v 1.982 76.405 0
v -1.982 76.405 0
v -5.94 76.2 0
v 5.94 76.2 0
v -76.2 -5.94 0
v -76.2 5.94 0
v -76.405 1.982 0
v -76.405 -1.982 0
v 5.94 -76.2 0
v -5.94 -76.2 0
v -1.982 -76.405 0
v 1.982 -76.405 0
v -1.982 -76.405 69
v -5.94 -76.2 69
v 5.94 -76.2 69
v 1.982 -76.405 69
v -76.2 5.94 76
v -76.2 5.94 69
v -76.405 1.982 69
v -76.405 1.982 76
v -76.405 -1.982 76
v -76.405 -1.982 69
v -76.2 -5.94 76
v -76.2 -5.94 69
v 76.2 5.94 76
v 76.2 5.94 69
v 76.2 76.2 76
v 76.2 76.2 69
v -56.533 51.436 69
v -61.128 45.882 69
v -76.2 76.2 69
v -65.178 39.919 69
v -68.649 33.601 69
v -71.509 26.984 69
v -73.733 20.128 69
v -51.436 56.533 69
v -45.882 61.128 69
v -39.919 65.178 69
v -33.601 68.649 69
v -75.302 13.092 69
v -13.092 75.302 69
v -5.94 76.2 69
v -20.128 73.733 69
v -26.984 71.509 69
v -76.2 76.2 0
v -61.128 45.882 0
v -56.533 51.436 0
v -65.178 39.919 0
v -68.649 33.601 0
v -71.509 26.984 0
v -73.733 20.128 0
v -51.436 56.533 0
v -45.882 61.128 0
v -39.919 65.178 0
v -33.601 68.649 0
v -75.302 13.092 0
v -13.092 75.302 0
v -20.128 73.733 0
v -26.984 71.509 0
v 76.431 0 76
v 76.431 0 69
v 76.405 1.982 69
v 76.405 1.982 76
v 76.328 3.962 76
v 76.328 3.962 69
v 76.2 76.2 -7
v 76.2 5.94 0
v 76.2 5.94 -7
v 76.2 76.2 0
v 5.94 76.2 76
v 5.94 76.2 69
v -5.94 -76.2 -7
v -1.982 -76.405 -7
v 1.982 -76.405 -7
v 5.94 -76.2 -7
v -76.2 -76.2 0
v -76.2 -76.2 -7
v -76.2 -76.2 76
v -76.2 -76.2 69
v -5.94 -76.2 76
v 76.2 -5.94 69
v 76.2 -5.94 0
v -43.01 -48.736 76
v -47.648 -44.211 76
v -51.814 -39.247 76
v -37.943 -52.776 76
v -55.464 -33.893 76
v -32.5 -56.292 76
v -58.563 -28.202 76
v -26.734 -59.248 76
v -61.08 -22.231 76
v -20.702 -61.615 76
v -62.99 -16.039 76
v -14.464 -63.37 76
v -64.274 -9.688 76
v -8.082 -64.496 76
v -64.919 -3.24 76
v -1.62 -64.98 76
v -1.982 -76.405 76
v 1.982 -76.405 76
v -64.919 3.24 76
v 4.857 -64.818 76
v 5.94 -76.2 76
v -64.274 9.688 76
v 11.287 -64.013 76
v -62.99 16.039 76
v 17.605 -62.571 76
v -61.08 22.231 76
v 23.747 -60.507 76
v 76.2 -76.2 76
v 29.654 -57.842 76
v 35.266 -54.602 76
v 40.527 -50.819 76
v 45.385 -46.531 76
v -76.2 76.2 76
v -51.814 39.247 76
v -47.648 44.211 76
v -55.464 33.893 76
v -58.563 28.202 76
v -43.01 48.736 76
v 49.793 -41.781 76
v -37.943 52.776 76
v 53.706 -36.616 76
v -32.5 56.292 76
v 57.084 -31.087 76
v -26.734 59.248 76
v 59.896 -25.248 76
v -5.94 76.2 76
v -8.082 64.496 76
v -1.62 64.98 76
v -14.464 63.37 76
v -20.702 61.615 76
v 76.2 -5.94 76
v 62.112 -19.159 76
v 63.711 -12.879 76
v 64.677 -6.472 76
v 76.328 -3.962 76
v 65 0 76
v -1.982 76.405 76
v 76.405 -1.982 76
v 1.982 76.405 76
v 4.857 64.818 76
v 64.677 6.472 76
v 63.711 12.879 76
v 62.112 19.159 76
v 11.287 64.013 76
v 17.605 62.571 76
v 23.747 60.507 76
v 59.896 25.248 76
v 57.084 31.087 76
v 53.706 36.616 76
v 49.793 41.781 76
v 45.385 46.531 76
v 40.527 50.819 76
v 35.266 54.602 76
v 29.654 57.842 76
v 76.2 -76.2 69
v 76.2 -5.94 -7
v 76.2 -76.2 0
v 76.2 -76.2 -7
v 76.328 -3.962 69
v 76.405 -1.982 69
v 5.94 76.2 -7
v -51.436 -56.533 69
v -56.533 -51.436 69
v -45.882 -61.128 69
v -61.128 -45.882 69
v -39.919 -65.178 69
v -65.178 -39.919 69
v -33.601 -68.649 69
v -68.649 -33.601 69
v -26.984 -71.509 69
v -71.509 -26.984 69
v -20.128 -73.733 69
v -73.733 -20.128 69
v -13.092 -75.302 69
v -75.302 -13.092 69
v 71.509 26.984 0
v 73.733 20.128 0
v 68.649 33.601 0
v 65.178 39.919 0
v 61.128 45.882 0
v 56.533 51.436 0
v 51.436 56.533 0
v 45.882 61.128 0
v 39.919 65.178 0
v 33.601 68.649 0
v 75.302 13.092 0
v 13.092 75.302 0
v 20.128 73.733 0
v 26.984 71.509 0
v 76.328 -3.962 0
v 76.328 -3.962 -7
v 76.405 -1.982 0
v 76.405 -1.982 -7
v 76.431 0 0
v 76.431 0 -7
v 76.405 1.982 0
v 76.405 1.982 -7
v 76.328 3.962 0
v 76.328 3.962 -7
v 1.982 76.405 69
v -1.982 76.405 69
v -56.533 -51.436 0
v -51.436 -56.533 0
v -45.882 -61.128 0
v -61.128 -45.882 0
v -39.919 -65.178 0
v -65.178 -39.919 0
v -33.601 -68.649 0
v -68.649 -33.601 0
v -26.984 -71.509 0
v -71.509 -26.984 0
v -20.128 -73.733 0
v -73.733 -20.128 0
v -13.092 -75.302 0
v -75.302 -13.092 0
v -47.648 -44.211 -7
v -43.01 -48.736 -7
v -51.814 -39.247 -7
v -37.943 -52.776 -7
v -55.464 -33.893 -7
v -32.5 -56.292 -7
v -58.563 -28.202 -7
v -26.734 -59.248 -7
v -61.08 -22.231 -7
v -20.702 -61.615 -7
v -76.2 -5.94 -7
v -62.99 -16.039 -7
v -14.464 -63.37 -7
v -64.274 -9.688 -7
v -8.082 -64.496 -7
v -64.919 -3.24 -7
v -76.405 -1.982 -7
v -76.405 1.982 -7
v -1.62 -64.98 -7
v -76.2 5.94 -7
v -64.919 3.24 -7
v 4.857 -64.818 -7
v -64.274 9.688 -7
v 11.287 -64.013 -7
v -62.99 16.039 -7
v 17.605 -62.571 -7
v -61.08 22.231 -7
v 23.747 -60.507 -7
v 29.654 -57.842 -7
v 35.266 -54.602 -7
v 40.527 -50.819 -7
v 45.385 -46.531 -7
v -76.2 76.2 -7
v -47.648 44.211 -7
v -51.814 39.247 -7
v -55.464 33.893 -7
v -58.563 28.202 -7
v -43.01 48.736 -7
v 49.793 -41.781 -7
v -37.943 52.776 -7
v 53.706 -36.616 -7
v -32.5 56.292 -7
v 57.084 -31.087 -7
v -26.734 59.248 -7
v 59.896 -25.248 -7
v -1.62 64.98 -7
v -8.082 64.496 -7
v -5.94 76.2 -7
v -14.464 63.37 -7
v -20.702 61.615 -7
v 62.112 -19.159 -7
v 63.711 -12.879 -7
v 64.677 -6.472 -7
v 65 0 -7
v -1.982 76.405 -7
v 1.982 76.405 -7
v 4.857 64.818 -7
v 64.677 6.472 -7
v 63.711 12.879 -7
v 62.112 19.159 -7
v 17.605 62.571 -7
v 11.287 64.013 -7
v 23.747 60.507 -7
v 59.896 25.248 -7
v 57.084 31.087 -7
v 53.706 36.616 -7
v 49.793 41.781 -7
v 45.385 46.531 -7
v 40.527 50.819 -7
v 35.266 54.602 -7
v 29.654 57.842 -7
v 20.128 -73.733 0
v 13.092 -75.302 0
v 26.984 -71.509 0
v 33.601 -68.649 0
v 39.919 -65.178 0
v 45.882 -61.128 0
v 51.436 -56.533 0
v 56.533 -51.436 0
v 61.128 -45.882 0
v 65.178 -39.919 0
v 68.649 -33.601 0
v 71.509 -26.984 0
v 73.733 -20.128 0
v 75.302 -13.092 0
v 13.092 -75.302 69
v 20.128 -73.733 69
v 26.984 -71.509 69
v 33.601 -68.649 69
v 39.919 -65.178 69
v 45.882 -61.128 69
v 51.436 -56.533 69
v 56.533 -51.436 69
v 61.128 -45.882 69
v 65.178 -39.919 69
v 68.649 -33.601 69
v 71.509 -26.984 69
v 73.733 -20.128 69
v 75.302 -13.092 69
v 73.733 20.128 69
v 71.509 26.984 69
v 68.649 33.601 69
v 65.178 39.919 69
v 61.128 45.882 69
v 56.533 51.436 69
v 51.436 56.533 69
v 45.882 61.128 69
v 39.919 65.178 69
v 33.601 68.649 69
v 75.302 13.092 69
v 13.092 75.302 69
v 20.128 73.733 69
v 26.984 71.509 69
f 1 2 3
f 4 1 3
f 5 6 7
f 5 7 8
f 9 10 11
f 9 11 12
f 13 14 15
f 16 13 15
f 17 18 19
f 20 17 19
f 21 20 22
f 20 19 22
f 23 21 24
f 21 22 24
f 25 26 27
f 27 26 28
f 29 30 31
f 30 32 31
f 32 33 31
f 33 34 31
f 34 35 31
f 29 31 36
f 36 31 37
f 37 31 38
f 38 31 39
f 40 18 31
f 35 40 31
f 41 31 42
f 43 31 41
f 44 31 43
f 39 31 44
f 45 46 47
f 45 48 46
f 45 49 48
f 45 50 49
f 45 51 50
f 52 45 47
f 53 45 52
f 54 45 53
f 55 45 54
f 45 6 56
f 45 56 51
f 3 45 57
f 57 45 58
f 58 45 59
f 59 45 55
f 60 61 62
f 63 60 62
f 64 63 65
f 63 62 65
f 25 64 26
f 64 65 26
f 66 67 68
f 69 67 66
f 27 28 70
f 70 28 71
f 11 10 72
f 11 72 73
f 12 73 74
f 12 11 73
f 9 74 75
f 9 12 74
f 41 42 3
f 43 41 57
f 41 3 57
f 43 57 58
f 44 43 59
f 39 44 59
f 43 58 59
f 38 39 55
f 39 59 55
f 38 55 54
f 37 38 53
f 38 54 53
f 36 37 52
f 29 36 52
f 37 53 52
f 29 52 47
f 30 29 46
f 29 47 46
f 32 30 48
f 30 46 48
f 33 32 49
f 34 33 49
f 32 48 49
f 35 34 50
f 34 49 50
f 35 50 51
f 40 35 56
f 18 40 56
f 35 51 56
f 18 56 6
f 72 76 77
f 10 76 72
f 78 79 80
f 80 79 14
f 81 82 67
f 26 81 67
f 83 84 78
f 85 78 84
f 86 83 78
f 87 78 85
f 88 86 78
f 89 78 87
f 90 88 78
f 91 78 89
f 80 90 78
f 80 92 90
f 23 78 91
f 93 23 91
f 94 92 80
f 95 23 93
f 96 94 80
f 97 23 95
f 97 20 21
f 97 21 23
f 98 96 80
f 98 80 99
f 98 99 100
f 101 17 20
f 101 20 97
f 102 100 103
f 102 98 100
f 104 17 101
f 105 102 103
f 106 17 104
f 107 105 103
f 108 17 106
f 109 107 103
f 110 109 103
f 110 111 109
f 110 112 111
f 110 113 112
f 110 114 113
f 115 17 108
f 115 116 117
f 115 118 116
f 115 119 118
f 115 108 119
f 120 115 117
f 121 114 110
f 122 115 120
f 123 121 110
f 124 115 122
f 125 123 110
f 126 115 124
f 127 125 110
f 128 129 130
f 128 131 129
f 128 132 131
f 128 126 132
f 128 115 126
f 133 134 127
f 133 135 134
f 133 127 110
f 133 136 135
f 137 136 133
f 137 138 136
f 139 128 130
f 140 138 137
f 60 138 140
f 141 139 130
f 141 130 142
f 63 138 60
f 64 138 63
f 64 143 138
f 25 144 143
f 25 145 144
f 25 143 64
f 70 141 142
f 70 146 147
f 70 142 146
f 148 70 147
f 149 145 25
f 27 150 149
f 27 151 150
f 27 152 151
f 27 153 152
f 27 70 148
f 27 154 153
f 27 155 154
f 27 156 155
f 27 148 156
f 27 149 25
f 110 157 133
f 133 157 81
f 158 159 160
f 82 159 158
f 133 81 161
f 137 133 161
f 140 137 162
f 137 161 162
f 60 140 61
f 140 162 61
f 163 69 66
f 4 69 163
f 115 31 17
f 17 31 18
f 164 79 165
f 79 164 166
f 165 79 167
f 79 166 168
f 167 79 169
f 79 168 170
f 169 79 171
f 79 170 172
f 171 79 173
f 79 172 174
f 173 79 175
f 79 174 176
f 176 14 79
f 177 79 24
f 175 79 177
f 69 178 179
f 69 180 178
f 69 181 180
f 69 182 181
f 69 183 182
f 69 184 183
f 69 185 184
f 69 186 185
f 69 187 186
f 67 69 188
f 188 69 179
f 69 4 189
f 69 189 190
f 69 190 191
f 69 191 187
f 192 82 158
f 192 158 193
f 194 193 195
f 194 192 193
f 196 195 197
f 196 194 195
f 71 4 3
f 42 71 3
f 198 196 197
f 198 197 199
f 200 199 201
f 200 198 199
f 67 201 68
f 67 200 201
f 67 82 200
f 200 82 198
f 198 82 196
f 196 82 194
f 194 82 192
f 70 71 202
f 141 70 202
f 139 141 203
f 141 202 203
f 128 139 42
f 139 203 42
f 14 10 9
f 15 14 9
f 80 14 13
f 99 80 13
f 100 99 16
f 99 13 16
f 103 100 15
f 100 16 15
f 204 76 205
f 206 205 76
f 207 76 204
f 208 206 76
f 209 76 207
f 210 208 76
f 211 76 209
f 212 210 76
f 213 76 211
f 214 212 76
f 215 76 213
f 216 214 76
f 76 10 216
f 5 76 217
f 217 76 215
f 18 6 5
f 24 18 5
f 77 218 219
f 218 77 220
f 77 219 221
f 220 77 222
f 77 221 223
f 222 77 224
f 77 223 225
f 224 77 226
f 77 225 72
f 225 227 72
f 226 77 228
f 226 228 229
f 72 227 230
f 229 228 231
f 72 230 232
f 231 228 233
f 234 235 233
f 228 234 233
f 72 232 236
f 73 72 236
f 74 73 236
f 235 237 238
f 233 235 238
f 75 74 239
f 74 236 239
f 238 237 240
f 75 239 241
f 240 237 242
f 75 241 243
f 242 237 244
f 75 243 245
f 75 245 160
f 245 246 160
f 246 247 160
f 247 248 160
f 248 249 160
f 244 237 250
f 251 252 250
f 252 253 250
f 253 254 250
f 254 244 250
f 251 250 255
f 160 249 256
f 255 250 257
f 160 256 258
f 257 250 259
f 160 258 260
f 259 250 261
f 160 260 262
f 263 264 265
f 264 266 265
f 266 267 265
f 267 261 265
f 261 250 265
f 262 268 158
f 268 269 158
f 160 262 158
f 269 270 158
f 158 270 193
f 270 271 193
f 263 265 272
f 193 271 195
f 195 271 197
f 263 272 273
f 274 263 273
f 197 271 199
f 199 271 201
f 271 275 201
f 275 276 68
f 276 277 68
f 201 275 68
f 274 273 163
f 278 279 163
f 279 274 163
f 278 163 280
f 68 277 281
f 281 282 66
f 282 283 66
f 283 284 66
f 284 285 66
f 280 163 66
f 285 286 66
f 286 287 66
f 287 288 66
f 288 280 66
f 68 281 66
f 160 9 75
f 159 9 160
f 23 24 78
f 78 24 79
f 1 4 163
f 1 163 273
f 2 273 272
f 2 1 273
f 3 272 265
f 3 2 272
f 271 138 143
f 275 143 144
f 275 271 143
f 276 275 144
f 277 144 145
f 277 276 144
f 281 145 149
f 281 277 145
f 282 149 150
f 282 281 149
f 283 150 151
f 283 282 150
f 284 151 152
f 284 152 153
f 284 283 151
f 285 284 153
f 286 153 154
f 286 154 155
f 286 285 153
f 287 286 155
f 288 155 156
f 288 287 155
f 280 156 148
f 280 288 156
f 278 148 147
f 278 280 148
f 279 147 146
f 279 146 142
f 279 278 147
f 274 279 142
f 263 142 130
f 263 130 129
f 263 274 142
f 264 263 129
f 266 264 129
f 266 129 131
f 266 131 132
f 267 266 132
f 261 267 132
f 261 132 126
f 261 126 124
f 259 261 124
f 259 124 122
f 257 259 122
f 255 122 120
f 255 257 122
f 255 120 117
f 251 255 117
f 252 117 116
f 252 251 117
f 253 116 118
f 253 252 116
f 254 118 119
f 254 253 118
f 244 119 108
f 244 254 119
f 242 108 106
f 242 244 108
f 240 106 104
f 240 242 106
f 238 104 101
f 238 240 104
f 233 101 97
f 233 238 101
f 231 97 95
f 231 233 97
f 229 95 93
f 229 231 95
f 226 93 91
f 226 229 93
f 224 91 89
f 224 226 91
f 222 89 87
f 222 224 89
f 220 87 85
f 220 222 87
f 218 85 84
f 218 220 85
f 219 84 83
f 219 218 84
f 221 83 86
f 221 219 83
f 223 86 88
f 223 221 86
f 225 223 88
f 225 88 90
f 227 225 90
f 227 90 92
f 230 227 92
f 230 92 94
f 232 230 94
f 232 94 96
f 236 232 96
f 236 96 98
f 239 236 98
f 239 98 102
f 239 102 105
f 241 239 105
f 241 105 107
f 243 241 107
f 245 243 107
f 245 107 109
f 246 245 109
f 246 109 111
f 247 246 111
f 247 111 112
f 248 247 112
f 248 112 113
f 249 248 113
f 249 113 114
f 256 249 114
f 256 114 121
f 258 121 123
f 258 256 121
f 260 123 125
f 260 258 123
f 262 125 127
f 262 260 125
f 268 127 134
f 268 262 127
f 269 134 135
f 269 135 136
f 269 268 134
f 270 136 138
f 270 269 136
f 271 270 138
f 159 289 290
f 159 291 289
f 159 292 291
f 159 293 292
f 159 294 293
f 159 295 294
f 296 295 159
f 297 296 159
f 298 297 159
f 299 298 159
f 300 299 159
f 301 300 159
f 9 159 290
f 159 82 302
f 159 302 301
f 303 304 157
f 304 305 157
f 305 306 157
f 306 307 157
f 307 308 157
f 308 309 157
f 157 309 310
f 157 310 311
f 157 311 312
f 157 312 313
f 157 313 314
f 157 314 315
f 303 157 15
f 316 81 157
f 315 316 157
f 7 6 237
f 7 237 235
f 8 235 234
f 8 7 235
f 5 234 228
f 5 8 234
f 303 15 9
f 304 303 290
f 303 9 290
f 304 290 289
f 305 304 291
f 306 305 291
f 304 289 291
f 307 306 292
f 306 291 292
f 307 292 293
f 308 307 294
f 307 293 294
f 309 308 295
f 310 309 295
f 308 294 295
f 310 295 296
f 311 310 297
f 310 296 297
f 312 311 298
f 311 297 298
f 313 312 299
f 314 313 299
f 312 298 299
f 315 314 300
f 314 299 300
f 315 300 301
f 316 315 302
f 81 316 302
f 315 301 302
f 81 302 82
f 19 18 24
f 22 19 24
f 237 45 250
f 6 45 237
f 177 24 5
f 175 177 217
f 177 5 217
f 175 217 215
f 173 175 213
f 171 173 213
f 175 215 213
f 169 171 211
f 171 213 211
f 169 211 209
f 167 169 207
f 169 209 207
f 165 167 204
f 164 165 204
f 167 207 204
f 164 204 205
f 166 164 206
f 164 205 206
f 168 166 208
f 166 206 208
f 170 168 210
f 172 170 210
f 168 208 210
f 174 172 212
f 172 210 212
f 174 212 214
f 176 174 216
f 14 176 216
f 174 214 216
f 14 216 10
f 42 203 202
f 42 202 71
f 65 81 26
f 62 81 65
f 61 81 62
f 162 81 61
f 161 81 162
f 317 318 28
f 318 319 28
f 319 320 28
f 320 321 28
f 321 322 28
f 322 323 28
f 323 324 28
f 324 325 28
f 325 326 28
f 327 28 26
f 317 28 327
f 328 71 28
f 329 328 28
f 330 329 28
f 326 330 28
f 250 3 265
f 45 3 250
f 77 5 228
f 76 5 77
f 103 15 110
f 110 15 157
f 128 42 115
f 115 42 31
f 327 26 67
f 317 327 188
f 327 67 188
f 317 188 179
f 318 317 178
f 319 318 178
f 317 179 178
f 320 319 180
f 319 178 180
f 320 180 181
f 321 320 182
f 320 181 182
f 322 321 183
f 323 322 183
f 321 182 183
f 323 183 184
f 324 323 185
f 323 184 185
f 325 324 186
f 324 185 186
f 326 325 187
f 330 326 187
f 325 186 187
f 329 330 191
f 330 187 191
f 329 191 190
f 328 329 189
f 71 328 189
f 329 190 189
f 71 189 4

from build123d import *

# Parameters (mm, degrees)
F0_R     = 65
F1_DEPTH = 69
F2_DEPTH = 7
F3_R     = 65
F4_DEPTH = 7


with BuildPart() as f1:
    # F0 (on Top) → F1 (new body)
    with BuildSketch(Plane.XY):
        with BuildLine():
            Line((-5.939693756, -76.2), (5.939693756, -76.2))
            ThreePointArc((5.939693756, -76.2), (54.0449810894, -54.0449810894), (76.2, -5.939693756))
            Line((76.2, -5.939693756), (76.2, 5.939693756))
            ThreePointArc((76.2, 5.939693756), (54.0449810894, 54.0449810894), (5.939693756, 76.2))
            Line((5.939693756, 76.2), (-5.939693756, 76.2))
            ThreePointArc((-5.939693756, 76.2), (-54.0449810894, 54.0449810894), (-76.2, 5.939693756))
            Line((-76.2, 5.939693756), (-76.2, -5.939693756))
            ThreePointArc((-76.2, -5.939693756), (-54.0449810894, -54.0449810894), (-5.939693756, -76.2))
        make_face()
        Circle(F0_R, mode=Mode.SUBTRACT)
    extrude(amount=F1_DEPTH)

    # F0 (on Top) → F2 (join)
    with BuildSketch(Plane.XY):
        with BuildLine():
            Line((5.939693756, -76.2), (76.2, -76.2))
            Line((76.2, -76.2), (76.2, -5.939693756))
            ThreePointArc((76.2, -5.939693756), (54.0449810894, -54.0449810894), (5.939693756, -76.2))
        make_face()
        with BuildLine():
            ThreePointArc((-5.939693756, -76.2), (0, -76.4311452349), (5.939693756, -76.2))
            Line((5.939693756, -76.2), (-5.939693756, -76.2))
        make_face()
        with BuildLine():
            Line((-5.939693756, -76.2), (5.939693756, -76.2))
            ThreePointArc((5.939693756, -76.2), (54.0449810894, -54.0449810894), (76.2, -5.939693756))
            Line((76.2, -5.939693756), (76.2, 5.939693756))
            ThreePointArc((76.2, 5.939693756), (54.0449810894, 54.0449810894), (5.939693756, 76.2))
            Line((5.939693756, 76.2), (-5.939693756, 76.2))
            ThreePointArc((-5.939693756, 76.2), (-54.0449810894, 54.0449810894), (-76.2, 5.939693756))
            Line((-76.2, 5.939693756), (-76.2, -5.939693756))
            ThreePointArc((-76.2, -5.939693756), (-54.0449810894, -54.0449810894), (-5.939693756, -76.2))
        make_face()
        Circle(F0_R, mode=Mode.SUBTRACT)
        with BuildLine():
            Line((76.2, 5.939693756), (76.2, -5.939693756))
            ThreePointArc((76.2, -5.939693756), (76.3733370648, -2.9720948014), (76.4311452349, 0))
            ThreePointArc((76.4311452349, 0), (76.3733370648, 2.9720948014), (76.2, 5.939693756))
        make_face()
        with BuildLine():
            Line((-76.2, -76.2), (-5.939693756, -76.2))
            ThreePointArc((-5.939693756, -76.2), (-54.0449810894, -54.0449810894), (-76.2, -5.939693756))
            Line((-76.2, -5.939693756), (-76.2, -76.2))
        make_face()
        with BuildLine():
            ThreePointArc((5.939693756, 76.2), (54.0449810894, 54.0449810894), (76.2, 5.939693756))
            Line((76.2, 5.939693756), (76.2, 76.2))
            Line((76.2, 76.2), (5.939693756, 76.2))
        make_face()
        with BuildLine():
            ThreePointArc((-76.2, 5.939693756), (-76.4311452349, 0), (-76.2, -5.939693756))
            Line((-76.2, -5.939693756), (-76.2, 5.939693756))
        make_face()
        with BuildLine():
            Line((-5.939693756, 76.2), (5.939693756, 76.2))
            ThreePointArc((5.939693756, 76.2), (0, 76.4311452349), (-5.939693756, 76.2))
        make_face()
        with BuildLine():
            Line((-76.2, 76.2), (-76.2, 5.939693756))
            ThreePointArc((-76.2, 5.939693756), (-54.0449810894, 54.0449810894), (-5.939693756, 76.2))
            Line((-5.939693756, 76.2), (-76.2, 76.2))
        make_face()
    extrude(amount=-F2_DEPTH)

    # F3 (on face) → F4 (join)
    with BuildSketch(Plane.XY.offset(69)):
        with BuildLine():
            Line((5.939693756, -76.2), (76.2, -76.2))
            Line((76.2, -76.2), (76.2, -5.939693756))
            ThreePointArc((76.2, -5.939693756), (54.0449810894, -54.0449810894), (5.939693756, -76.2))
        make_face()
        with BuildLine():
            ThreePointArc((-5.939693756, -76.2), (0, -76.4311452349), (5.939693756, -76.2))
            Line((5.939693756, -76.2), (-5.939693756, -76.2))
        make_face()
        with BuildLine():
            Line((-5.939693756, -76.2), (5.939693756, -76.2))
            ThreePointArc((5.939693756, -76.2), (54.0449810894, -54.0449810894), (76.2, -5.939693756))
            Line((76.2, -5.939693756), (76.2, 5.939693756))
            ThreePointArc((76.2, 5.939693756), (54.0449810894, 54.0449810894), (5.939693756, 76.2))
            Line((5.939693756, 76.2), (-5.939693756, 76.2))
            ThreePointArc((-5.939693756, 76.2), (-54.0449810894, 54.0449810894), (-76.2, 5.939693756))
            Line((-76.2, 5.939693756), (-76.2, -5.939693756))
            ThreePointArc((-76.2, -5.939693756), (-54.0449810894, -54.0449810894), (-5.939693756, -76.2))
        make_face()
        Circle(F3_R, mode=Mode.SUBTRACT)
        with BuildLine():
            Line((76.2, 5.939693756), (76.2, -5.939693756))
            ThreePointArc((76.2, -5.939693756), (76.3733370648, -2.9720948014), (76.4311452349, 0))
            ThreePointArc((76.4311452349, 0), (76.3733370648, 2.9720948014), (76.2, 5.939693756))
        make_face()
        with BuildLine():
            Line((-76.2, -76.2), (-5.939693756, -76.2))
            ThreePointArc((-5.939693756, -76.2), (-54.0449810894, -54.0449810894), (-76.2, -5.939693756))
            Line((-76.2, -5.939693756), (-76.2, -76.2))
        make_face()
        with BuildLine():
            ThreePointArc((5.939693756, 76.2), (54.0449810894, 54.0449810894), (76.2, 5.939693756))
            Line((76.2, 5.939693756), (76.2, 76.2))
            Line((76.2, 76.2), (5.939693756, 76.2))
        make_face()
        with BuildLine():
            ThreePointArc((-76.2, 5.939693756), (-76.4311452349, 0), (-76.2, -5.939693756))
            Line((-76.2, -5.939693756), (-76.2, 5.939693756))
        make_face()
        with BuildLine():
            Line((-5.939693756, 76.2), (5.939693756, 76.2))
            ThreePointArc((5.939693756, 76.2), (0, 76.4311452349), (-5.939693756, 76.2))
        make_face()
        with BuildLine():
            Line((-76.2, 76.2), (-76.2, 5.939693756))
            ThreePointArc((-76.2, 5.939693756), (-54.0449810894, 54.0449810894), (-5.939693756, 76.2))
            Line((-5.939693756, 76.2), (-76.2, 76.2))
        make_face()
    extrude(amount=F4_DEPTH)


solid = f1.part
